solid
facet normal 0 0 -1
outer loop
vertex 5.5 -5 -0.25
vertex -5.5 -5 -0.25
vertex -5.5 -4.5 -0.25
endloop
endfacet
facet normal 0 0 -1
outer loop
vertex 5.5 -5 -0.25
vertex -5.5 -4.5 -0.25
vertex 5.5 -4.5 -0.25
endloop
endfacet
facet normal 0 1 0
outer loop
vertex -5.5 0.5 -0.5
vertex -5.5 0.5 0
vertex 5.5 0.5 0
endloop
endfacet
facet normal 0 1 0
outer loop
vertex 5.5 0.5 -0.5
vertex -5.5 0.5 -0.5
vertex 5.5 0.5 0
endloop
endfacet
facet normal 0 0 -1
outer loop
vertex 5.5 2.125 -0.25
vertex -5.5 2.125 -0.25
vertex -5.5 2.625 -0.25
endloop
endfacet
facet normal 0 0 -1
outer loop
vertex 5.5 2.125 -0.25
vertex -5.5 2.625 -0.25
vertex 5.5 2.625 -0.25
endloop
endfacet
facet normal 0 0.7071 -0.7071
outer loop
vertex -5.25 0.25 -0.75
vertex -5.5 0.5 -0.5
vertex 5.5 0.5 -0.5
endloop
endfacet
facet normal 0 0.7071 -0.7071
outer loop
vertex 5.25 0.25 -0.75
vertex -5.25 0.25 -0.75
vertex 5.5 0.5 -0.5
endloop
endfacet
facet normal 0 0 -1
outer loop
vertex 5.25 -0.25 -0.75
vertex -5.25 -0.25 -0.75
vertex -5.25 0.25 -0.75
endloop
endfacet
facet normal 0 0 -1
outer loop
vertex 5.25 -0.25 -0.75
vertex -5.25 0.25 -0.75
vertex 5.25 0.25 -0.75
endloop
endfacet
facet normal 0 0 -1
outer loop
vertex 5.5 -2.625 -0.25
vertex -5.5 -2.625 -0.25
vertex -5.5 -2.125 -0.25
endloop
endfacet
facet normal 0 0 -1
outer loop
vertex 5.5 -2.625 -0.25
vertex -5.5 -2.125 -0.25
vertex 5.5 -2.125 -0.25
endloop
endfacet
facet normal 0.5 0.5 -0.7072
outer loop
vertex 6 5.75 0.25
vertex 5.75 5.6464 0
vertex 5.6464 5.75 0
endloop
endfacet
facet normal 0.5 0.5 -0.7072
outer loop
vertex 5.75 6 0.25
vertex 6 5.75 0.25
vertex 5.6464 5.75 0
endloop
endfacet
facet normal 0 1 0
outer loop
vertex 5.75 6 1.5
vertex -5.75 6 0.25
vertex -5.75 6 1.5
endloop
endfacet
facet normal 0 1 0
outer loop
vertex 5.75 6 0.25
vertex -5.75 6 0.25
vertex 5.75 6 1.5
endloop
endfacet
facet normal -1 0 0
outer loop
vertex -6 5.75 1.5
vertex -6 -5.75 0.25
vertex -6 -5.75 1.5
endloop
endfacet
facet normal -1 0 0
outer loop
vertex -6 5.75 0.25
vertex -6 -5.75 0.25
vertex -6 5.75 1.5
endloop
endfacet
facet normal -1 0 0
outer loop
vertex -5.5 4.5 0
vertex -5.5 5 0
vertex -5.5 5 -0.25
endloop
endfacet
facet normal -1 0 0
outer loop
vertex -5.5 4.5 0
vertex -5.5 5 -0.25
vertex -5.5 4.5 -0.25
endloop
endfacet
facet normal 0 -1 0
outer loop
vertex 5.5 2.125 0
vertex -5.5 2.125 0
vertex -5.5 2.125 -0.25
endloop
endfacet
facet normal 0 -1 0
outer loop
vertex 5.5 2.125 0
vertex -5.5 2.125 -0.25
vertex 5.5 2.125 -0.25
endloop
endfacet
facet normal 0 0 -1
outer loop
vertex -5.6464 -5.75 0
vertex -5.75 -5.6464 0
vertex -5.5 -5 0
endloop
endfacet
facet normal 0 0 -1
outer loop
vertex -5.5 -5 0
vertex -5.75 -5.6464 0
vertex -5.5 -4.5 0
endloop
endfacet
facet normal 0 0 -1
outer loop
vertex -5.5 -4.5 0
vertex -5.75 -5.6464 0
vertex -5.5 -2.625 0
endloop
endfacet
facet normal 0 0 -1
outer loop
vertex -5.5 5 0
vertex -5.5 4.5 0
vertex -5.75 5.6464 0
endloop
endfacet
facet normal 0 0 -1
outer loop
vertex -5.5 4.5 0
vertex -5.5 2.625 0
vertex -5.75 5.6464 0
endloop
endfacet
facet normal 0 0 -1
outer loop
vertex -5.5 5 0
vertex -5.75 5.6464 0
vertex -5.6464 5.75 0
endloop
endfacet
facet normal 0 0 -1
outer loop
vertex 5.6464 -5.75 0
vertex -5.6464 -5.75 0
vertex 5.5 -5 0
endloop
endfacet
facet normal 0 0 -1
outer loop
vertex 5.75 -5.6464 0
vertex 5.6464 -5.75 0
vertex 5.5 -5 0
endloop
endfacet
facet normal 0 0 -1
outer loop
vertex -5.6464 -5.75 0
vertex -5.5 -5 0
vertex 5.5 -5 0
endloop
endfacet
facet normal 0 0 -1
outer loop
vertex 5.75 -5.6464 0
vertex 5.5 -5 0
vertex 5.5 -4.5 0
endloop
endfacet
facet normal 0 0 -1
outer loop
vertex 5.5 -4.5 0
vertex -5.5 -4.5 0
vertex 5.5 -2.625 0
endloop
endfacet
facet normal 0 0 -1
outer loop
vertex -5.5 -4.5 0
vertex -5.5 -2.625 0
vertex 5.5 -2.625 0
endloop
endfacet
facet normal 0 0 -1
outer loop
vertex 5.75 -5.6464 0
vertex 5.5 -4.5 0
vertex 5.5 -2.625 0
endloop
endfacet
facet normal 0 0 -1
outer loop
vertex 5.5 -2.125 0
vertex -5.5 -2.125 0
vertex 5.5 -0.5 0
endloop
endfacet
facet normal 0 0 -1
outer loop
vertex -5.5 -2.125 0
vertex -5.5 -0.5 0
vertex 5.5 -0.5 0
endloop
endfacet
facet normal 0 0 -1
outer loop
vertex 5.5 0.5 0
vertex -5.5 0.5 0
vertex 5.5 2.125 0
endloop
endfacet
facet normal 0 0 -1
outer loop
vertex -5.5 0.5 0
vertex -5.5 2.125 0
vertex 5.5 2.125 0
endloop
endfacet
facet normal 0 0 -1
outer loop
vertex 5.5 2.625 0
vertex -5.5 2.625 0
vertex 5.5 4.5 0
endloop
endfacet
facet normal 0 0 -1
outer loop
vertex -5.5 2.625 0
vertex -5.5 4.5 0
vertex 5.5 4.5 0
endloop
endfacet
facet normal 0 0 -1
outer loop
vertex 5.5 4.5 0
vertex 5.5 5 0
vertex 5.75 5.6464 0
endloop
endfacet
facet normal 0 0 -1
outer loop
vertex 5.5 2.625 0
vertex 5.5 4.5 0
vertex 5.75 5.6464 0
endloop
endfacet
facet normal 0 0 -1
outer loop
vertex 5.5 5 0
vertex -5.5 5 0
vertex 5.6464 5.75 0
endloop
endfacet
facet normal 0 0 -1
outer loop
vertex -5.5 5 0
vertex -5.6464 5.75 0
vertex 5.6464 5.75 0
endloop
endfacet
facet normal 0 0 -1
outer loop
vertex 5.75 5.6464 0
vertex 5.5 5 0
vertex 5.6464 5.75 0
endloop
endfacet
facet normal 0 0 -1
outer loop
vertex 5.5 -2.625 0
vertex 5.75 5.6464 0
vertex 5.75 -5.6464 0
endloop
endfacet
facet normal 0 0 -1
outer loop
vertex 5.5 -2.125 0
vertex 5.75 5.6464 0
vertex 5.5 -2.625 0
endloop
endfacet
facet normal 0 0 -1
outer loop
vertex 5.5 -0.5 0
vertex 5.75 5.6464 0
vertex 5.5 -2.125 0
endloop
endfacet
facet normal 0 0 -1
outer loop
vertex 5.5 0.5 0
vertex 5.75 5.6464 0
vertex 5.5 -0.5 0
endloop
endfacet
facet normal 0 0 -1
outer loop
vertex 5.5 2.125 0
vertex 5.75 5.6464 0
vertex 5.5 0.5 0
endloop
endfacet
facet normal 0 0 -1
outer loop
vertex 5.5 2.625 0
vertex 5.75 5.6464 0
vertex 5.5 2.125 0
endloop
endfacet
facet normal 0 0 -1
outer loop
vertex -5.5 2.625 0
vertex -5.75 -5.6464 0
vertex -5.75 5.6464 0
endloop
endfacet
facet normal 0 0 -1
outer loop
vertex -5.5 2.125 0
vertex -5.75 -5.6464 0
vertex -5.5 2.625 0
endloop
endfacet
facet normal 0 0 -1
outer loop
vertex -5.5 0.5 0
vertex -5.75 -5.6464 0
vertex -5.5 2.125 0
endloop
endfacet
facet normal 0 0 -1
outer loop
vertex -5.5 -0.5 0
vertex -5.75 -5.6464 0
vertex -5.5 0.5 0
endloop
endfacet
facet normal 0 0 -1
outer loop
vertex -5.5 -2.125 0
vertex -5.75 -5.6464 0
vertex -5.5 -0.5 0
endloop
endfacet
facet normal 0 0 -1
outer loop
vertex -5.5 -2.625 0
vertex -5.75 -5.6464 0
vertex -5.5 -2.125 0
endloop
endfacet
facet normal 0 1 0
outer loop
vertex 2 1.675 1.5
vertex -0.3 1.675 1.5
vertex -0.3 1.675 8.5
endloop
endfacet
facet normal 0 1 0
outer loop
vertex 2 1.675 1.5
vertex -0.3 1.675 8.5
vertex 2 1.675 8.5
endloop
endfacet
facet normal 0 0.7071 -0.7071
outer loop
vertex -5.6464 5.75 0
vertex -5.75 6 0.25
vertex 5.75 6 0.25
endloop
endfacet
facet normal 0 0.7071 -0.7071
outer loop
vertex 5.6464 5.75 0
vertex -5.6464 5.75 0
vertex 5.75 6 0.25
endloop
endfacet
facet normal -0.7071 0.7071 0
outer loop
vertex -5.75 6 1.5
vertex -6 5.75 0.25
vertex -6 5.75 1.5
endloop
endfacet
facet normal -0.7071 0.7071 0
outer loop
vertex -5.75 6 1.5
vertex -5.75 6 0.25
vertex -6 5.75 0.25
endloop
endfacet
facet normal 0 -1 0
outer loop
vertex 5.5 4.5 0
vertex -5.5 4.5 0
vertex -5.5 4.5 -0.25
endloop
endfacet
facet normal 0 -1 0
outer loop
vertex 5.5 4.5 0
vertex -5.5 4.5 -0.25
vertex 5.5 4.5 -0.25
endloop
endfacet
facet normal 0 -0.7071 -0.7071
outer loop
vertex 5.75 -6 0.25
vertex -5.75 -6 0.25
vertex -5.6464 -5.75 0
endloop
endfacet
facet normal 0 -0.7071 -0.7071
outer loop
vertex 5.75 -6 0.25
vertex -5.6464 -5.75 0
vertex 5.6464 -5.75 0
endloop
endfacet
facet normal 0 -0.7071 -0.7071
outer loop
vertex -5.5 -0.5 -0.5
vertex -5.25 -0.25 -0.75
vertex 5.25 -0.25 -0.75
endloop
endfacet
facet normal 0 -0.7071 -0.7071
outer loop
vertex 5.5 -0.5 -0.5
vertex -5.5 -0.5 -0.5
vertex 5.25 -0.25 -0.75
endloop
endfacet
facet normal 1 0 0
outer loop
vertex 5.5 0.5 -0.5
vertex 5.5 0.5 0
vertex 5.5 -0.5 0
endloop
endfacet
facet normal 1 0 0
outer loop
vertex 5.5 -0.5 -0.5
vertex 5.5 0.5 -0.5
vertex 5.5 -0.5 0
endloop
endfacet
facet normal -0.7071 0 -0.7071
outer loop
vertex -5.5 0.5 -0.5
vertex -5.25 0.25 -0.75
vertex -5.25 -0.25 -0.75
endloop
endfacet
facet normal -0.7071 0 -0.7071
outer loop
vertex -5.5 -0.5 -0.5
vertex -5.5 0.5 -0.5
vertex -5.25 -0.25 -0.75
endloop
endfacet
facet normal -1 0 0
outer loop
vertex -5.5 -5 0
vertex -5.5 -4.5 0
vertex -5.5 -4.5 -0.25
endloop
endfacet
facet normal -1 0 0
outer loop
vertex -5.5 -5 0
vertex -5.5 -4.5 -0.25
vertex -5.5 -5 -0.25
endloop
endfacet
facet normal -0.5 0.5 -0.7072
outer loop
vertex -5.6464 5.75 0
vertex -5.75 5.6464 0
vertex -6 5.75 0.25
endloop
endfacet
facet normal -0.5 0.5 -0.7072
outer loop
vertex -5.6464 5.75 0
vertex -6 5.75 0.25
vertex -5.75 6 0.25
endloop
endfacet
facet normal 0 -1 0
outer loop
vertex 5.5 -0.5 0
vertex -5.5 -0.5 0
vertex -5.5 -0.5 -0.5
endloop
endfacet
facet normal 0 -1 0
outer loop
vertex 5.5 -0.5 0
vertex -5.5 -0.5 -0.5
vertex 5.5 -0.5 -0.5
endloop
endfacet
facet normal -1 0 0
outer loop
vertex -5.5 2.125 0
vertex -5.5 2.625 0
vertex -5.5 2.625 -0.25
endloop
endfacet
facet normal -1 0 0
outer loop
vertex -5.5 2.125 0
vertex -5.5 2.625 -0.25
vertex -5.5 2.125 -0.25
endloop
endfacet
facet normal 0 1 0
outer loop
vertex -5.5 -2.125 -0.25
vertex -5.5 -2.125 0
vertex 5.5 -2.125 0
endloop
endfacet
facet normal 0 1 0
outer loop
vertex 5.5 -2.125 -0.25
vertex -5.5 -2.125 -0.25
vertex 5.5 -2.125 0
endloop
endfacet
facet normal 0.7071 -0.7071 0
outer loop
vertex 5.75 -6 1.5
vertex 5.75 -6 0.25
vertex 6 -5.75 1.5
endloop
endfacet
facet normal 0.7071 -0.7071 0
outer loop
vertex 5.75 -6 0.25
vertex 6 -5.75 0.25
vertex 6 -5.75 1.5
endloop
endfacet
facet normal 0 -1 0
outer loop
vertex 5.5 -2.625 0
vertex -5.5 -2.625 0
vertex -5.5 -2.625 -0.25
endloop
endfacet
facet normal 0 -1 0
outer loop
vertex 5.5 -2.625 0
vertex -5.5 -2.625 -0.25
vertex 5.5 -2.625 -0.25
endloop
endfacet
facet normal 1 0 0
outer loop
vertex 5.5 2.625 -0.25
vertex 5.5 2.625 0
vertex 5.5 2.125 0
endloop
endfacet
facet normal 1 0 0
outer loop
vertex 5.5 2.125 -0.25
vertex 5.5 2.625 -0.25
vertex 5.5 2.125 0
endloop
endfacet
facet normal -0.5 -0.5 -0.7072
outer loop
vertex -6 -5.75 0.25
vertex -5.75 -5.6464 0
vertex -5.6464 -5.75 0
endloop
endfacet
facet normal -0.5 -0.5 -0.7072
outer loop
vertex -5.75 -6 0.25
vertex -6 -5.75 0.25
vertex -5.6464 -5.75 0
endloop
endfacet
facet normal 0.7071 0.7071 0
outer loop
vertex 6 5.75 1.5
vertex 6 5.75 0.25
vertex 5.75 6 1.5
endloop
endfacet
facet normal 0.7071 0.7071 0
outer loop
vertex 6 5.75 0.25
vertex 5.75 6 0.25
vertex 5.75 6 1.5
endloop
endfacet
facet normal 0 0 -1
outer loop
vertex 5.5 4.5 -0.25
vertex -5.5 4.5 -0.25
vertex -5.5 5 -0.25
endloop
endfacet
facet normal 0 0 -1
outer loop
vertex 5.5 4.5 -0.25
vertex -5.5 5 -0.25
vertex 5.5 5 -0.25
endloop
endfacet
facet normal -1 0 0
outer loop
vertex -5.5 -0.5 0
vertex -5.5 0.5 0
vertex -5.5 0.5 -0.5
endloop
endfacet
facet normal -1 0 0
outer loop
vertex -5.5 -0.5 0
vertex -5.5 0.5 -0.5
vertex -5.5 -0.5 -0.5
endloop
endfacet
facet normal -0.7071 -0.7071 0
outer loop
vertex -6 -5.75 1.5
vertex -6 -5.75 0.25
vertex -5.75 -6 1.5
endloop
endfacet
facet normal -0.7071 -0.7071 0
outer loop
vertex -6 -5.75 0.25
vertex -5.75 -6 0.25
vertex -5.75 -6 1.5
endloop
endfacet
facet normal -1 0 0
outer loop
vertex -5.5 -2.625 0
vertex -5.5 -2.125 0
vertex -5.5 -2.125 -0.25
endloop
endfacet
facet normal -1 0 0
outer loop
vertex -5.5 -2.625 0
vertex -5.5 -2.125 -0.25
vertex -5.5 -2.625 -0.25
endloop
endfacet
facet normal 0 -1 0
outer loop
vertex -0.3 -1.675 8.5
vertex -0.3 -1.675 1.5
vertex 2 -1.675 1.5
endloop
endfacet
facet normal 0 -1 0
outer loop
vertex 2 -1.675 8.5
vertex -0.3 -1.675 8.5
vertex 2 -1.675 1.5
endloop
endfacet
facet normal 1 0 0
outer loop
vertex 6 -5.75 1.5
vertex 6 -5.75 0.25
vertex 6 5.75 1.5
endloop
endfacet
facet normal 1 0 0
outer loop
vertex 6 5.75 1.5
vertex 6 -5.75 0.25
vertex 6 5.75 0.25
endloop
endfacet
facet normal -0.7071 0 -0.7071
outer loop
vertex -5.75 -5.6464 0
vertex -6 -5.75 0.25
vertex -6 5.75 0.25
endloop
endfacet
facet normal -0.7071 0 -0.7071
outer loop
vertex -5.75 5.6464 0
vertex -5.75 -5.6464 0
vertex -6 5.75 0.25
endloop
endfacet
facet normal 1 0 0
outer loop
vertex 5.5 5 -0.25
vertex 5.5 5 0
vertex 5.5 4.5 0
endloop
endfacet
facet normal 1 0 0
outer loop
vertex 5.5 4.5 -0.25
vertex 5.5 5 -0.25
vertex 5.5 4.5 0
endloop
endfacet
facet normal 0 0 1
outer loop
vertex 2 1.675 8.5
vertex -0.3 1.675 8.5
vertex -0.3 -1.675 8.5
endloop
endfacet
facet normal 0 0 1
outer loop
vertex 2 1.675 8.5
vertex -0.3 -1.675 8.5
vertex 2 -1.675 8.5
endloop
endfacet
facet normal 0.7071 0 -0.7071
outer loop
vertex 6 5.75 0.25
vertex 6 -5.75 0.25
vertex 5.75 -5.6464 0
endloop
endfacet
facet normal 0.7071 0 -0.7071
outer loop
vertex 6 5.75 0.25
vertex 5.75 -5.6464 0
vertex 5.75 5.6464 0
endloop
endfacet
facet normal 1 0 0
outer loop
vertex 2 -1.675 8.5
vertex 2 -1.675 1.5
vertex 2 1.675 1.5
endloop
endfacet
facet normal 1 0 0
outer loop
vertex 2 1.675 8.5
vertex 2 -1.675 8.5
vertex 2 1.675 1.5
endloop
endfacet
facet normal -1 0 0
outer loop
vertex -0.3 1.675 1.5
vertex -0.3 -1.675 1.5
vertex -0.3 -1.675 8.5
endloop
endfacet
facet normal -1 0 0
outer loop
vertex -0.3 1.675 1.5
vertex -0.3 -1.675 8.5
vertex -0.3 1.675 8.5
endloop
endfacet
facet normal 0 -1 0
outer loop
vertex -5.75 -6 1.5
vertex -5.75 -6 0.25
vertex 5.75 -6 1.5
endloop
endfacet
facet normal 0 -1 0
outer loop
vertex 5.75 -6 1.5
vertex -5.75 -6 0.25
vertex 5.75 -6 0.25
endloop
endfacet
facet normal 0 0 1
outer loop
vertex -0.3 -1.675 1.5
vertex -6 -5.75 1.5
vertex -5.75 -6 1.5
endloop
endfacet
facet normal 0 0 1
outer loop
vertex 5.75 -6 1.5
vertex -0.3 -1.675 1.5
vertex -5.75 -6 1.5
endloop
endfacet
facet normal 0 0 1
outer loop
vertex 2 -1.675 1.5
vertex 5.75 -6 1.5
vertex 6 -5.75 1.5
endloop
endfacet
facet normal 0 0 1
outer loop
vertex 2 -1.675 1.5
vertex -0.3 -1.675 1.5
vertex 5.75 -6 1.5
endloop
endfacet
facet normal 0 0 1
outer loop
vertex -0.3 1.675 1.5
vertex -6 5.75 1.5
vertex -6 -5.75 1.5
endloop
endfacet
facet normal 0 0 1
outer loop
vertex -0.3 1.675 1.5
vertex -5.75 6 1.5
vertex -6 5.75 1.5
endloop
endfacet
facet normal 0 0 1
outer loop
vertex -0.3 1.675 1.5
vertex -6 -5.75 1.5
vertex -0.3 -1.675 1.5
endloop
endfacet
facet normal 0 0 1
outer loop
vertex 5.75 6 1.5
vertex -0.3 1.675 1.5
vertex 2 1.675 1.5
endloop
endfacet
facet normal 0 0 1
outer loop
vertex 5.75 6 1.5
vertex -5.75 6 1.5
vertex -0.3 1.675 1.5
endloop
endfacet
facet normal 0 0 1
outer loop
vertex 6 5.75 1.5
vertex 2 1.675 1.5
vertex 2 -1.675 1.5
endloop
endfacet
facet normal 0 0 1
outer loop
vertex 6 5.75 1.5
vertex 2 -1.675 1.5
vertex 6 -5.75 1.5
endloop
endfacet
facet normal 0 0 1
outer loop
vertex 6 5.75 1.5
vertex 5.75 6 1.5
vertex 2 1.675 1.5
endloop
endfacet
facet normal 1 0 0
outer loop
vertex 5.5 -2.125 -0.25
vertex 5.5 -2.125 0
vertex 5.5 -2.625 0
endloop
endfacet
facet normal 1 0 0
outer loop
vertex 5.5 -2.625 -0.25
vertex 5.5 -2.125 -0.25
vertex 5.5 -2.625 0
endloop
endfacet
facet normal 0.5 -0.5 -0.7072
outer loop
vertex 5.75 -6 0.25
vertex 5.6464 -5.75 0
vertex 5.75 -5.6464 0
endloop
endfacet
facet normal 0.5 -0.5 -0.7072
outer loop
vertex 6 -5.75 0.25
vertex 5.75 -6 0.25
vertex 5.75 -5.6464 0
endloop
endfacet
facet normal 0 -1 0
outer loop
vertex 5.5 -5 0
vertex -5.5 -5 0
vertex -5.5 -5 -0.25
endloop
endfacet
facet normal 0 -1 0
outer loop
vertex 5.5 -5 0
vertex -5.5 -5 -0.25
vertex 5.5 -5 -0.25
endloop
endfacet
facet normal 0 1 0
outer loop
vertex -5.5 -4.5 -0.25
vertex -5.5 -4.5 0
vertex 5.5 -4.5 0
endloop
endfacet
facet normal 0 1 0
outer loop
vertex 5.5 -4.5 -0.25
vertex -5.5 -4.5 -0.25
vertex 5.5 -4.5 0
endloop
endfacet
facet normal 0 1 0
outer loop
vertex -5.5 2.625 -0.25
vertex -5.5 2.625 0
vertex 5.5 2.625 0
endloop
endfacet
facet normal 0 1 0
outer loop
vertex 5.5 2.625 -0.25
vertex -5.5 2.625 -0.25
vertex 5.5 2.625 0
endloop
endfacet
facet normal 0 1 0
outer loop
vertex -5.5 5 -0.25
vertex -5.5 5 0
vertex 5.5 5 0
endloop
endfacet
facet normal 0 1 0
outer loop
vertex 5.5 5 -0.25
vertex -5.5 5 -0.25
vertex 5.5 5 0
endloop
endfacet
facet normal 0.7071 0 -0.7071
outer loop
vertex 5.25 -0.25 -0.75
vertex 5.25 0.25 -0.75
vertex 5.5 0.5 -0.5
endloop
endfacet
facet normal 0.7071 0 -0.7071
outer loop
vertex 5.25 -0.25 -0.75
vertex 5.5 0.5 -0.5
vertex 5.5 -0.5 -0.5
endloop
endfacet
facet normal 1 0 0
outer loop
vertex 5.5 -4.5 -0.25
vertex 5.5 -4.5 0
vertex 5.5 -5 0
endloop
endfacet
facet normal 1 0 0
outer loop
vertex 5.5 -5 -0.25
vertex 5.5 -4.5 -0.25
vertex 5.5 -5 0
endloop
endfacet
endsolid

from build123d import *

# Parameters (mm, degrees)
SKETCH_W            = 12
SKETCH_H            = 12
PAD_DEPTH           = 1.5
SKETCH001_W         = 2.3
SKETCH001_H         = 3.35
PAD001_DEPTH        = 7
SKETCH002_W         = 11
SKETCH002_H         = 0.5
PAD002_DEPTH        = 0.25
LINEARPATTERN_COUNT = 5
LINEARPATTERN_PITCH = 2.375
SKETCH003_W         = 11
SKETCH003_H         = 1
PAD003_DEPTH        = 0.75
CHAMFER_SIZE        = 0.25
CHAMFER001_SIZE     = 0.25
CHAMFER002_SIZE     = 0.25


with BuildPart() as part:
    # Sketch → Pad (new body)
    with BuildSketch(Plane.XY):
        Rectangle(SKETCH_W, SKETCH_H)
    extrude(amount=PAD_DEPTH)

    # Sketch001 → Pad001 (join)
    with BuildSketch(Plane.XY.offset(1.5)):
        with Locations((0.85, 0)):
            Rectangle(SKETCH001_W, SKETCH001_H)
    extrude(amount=PAD001_DEPTH)

    # Sketch002 (on DatumPlane) → Pad002 (join)
    with BuildSketch(Plane(origin=(0, 0, 0), x_dir=(1, 0, 0), z_dir=(0, 0, -1))):
        with Locations((0, 4.75)):
            Rectangle(SKETCH002_W, SKETCH002_H)
    pad002 = extrude(amount=PAD002_DEPTH)

    # LinearPattern: Pad002 ×5
    with Locations(*[(0, i * LINEARPATTERN_PITCH, 0) for i in range(1, LINEARPATTERN_COUNT)]):
        add(pad002)

    # Sketch003 (on DatumPlane) → Pad003 (join)
    with BuildSketch(Plane(origin=(0, 0, 0), x_dir=(1, 0, 0), z_dir=(0, 0, -1))):
        Rectangle(SKETCH003_W, SKETCH003_H)
    extrude(amount=PAD003_DEPTH)

    # Chamfer
    chamfer_edges = [part.edges().sort_by_distance(p)[0] for p in [
        (5.5, 0, -0.75),
        (0, 0.5, -0.75),
        (0, -0.5, -0.75),
        (-5.5, 0, -0.75),
    ]]
    chamfer(chamfer_edges, length=CHAMFER_SIZE)

    # Chamfer001
    chamfer001_edges = [part.edges().sort_by_distance(p)[0] for p in [
        (6, -6, 0.75),
        (-6, -6, 0.75),
        (-6, 6, 0.75),
        (6, 6, 0.75),
    ]]
    chamfer(chamfer001_edges, length=CHAMFER001_SIZE)

    # Chamfer002
    chamfer002_edges = [part.edges().sort_by_distance(p)[0] for p in [
        (0, -6, 0),
        (6, 0, 0),
        (5.875, -5.875, 0),
        (-5.875, -5.875, 0),
        (-6, 0, 0),
        (0, 6, 0),
        (-5.875, 5.875, 0),
        (5.875, 5.875, 0),
    ]]
    chamfer(chamfer002_edges, length=CHAMFER002_SIZE)


solid = part.part
